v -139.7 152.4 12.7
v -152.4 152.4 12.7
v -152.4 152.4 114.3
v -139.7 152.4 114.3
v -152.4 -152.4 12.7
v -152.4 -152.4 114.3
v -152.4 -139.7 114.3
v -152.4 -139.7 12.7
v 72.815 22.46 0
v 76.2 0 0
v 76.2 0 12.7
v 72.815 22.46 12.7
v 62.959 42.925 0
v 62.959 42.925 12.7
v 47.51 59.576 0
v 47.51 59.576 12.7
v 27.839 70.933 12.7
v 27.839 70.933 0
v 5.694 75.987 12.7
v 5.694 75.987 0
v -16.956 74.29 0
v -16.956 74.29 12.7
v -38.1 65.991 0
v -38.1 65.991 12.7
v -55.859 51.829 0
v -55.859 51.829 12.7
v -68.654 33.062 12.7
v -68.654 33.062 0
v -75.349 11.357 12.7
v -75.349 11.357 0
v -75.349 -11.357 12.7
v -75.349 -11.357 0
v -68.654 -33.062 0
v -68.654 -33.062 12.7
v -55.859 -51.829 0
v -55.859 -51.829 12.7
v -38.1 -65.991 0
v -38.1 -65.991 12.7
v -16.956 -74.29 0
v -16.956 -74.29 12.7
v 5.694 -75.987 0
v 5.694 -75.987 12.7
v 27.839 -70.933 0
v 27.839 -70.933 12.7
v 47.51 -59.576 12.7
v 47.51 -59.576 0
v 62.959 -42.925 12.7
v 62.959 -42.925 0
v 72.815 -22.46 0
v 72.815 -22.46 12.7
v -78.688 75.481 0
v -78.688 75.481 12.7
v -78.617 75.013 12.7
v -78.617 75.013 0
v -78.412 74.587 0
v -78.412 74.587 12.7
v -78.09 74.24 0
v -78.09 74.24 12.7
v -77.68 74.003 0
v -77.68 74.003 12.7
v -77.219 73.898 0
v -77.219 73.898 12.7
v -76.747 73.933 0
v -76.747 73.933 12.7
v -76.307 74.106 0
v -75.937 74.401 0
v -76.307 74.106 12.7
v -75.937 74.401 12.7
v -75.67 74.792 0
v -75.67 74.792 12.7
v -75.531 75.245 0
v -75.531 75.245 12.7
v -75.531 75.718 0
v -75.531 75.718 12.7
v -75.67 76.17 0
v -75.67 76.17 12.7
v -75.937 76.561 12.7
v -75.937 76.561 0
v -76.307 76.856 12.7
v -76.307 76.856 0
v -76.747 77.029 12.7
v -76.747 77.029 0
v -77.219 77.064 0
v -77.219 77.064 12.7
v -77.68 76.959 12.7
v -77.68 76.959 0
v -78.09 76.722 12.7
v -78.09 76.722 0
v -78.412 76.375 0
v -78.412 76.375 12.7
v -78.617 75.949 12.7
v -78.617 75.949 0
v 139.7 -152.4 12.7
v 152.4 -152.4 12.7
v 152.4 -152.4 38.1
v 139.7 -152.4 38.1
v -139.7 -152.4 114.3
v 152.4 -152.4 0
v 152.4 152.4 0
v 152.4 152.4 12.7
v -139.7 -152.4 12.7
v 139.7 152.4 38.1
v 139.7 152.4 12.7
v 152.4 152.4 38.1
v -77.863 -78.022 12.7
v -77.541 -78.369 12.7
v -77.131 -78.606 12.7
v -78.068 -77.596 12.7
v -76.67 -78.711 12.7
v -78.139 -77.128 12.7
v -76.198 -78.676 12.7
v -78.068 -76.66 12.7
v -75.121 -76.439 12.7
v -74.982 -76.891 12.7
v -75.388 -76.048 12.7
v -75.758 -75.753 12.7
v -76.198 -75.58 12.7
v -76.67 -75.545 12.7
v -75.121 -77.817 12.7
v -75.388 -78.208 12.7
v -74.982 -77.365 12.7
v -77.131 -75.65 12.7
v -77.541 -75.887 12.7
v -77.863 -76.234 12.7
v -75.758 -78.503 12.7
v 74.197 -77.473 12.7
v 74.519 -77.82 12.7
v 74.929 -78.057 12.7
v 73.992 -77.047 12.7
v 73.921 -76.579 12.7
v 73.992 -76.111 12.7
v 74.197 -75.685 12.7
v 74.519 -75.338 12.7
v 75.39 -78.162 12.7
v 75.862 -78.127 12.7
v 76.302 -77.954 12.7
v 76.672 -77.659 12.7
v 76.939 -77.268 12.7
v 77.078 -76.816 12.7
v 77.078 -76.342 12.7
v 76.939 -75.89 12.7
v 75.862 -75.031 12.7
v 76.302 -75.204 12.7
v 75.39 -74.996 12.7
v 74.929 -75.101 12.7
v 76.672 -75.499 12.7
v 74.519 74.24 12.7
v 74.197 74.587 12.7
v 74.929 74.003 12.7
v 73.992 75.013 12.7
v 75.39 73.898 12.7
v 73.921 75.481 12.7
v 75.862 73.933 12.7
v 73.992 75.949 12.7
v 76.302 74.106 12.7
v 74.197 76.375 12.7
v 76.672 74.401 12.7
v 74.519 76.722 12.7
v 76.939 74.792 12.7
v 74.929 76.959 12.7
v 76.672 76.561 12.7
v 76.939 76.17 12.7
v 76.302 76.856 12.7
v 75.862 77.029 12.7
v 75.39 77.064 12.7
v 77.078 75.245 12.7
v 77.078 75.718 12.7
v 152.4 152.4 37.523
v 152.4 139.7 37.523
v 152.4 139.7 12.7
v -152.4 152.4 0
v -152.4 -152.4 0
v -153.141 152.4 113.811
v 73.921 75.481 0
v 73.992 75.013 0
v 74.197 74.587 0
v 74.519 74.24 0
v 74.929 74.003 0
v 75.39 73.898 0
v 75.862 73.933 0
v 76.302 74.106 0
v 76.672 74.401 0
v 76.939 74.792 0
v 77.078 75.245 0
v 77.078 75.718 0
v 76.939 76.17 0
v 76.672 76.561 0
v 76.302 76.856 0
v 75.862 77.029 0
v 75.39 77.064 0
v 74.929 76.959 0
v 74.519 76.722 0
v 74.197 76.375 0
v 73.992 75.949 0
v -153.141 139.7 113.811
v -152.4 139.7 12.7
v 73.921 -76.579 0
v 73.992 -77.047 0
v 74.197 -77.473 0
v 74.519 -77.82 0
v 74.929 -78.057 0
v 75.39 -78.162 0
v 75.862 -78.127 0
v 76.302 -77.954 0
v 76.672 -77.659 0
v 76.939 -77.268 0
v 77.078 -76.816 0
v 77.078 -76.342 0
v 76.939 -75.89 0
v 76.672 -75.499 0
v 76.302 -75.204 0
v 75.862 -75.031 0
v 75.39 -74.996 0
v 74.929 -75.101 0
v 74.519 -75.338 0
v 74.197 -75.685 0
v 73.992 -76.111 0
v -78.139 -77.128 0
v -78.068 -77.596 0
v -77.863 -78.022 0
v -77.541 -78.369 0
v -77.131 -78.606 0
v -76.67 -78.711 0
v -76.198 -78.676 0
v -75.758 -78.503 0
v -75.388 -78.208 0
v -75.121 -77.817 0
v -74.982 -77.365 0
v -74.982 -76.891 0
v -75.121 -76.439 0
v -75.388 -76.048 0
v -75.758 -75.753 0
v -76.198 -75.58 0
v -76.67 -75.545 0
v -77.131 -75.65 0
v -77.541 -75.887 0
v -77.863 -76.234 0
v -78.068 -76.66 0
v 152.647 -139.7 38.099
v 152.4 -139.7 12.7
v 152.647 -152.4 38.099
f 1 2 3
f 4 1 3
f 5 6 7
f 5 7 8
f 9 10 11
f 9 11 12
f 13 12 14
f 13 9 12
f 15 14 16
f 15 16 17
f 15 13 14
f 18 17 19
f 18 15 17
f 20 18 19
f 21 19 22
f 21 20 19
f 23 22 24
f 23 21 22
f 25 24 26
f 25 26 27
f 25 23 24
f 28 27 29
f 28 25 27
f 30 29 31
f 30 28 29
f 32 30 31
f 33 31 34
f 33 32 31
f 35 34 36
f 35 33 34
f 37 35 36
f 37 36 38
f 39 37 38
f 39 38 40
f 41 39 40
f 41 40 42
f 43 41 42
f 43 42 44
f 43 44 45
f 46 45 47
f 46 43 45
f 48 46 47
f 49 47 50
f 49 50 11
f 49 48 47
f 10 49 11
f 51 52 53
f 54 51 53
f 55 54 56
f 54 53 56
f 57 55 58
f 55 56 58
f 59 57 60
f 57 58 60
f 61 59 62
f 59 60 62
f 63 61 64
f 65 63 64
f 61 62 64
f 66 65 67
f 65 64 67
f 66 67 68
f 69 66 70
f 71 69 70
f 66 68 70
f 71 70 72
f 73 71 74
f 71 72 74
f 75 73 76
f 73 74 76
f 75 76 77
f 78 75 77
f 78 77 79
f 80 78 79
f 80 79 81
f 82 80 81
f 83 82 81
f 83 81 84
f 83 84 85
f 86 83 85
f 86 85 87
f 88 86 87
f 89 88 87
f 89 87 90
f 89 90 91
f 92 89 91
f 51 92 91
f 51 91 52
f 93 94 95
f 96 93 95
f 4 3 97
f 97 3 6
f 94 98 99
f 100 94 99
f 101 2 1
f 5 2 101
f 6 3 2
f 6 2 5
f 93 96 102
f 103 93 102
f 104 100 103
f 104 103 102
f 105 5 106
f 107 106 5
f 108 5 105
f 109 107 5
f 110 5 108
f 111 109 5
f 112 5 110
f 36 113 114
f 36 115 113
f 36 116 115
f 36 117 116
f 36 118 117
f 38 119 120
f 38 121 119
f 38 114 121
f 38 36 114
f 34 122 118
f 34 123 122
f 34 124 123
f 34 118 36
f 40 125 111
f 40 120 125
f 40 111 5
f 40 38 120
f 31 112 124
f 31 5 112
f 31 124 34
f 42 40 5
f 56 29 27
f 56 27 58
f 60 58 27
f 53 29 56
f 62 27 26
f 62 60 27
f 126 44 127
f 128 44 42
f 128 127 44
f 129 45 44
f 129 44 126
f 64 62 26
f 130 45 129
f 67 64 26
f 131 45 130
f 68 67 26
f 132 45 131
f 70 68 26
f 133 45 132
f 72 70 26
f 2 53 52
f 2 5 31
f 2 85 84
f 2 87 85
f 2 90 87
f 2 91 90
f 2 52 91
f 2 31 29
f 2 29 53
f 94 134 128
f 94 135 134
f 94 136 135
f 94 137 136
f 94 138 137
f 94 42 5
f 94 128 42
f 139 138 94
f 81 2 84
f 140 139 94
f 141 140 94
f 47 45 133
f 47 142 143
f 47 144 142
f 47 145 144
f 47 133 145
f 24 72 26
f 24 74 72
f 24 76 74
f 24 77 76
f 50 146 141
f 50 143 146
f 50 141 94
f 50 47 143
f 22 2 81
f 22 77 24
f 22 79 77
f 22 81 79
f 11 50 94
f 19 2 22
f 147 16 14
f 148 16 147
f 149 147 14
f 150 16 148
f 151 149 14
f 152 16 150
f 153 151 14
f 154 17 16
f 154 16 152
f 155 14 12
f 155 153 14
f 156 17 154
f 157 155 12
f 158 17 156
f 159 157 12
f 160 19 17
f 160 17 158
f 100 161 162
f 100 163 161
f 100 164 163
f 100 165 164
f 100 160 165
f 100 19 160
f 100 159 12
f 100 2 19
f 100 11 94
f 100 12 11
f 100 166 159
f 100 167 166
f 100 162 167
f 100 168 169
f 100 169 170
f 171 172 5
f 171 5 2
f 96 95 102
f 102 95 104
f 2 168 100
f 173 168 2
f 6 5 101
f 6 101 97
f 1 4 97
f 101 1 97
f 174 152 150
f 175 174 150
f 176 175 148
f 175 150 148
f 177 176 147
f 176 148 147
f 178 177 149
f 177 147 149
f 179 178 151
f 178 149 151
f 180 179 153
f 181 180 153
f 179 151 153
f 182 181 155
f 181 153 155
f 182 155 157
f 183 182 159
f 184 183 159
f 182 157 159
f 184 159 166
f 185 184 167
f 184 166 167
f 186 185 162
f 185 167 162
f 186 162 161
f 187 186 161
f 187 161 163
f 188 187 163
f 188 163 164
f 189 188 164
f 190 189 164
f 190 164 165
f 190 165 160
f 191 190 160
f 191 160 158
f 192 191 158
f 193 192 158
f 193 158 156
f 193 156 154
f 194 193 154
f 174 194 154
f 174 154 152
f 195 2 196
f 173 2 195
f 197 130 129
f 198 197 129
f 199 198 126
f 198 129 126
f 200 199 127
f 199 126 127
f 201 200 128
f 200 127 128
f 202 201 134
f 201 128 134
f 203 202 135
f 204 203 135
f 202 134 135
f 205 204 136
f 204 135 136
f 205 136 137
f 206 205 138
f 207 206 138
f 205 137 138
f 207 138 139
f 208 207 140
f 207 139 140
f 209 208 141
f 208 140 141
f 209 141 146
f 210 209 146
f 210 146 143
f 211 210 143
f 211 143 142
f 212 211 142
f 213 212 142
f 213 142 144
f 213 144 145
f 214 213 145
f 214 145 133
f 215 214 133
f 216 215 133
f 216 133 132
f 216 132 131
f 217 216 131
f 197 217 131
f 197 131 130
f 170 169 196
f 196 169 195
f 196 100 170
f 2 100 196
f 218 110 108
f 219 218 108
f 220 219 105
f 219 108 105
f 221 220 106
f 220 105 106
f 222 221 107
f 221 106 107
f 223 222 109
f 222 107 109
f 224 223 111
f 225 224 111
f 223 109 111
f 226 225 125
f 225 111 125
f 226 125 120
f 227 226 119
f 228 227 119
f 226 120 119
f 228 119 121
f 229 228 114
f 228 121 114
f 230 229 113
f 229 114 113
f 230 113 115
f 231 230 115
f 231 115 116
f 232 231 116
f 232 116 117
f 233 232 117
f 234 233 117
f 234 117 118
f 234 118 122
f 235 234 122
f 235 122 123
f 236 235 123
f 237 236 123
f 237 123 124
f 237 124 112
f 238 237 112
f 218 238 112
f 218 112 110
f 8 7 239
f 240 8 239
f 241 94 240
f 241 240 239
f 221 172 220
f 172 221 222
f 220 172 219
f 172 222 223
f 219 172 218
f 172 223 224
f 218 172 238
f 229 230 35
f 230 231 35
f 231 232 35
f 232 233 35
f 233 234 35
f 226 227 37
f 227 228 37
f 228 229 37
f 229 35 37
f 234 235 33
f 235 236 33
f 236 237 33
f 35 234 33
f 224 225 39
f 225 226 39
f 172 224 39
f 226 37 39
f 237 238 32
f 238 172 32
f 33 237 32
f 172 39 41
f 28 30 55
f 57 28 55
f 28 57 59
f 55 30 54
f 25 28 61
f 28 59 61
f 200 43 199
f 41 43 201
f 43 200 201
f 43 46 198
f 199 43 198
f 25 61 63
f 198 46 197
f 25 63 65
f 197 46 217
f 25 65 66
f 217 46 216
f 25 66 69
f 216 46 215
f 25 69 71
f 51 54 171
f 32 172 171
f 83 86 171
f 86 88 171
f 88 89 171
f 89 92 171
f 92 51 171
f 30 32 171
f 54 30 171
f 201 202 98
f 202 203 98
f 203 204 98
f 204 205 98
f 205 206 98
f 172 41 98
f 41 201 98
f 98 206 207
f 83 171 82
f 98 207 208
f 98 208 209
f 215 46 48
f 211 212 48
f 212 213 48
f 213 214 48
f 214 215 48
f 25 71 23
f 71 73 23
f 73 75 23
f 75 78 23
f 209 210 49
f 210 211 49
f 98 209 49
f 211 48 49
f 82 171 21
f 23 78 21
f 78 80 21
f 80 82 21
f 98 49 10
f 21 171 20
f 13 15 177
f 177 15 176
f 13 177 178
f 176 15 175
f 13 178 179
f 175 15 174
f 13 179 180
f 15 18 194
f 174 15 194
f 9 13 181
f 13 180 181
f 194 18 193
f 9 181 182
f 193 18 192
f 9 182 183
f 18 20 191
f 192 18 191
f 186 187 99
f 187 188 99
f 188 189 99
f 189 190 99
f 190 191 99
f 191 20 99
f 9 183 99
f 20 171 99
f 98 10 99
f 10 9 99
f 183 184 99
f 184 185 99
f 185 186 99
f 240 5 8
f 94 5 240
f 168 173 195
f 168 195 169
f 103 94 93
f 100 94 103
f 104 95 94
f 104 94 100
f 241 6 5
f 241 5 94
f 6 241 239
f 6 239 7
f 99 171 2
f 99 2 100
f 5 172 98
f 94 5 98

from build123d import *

# Parameters (mm, degrees)
F0_W      = 304.8
F0_H      = 304.8
F0_R      = 76.2
F1_DEPTH  = 12.7
F6_DEPTH  = 12.7
F7_DEPTH  = 12.7
F4_W      = 304.8
F4_H      = 25.4
F9_DEPTH  = 12.7
F8_W      = 304.8
F8_H      = 101.6
F10_DEPTH = 12.7
F12_D     = 3.175


with BuildPart() as f1:
    # F0 (on Top) → F1 (new body)
    with BuildSketch(Plane.XY):
        Rectangle(F0_W, F0_H)
        Circle(F0_R, mode=Mode.SUBTRACT)
    extrude(amount=F1_DEPTH)

    # F12 (through all)
    with Locations(Plane(origin=(0, 0, 0), x_dir=(1, 0, 0), z_dir=(0, 0, -1))):
        with Locations((-76.551482, 77.127993), (75.508684, 76.579042), (75.508684, -75.481132), (-77.100433, -75.481132)):
            Hole(F12_D / 2)


with BuildPart() as f6:
    # F2 (on face) → F6 (new body)
    with BuildSketch(Plane.XZ.offset(152.4)):
        Polygon((-152.4, 114.3), (-152.4, 12.7), (152.4, 12.7), (152.646845, 38.098801), align=None)
    extrude(amount=-F6_DEPTH)


with BuildPart() as f7:
    # F5 (on face) → F7 (new body)
    with BuildSketch(Plane(origin=(0, 152.4, 0), x_dir=(-1, 0, 0), z_dir=(0, 1, 0))):
        Polygon((-152.4, 37.522878), (-152.4, 12.7), (152.4, 12.7), (153.140679, 113.810666), align=None)
    extrude(amount=-F7_DEPTH)


with BuildPart() as f9:
    # F4 (on face) → F9 (new body)
    with BuildSketch(Plane.YZ.offset(152.4)):
        with Locations((0, 25.4)):
            Rectangle(F4_W, F4_H)
    extrude(amount=-F9_DEPTH)


with BuildPart() as f10:
    # F8 (on face) → F10 (new body)
    with BuildSketch(Plane(origin=(-152.4, 0, 0), x_dir=(0, -1, 0), z_dir=(-1, 0, 0))):
        with Locations((0, 63.5)):
            Rectangle(F8_W, F8_H)
    extrude(amount=-F10_DEPTH)


solid = Compound([f1.part, f6.part, f7.part, f9.part, f10.part])
